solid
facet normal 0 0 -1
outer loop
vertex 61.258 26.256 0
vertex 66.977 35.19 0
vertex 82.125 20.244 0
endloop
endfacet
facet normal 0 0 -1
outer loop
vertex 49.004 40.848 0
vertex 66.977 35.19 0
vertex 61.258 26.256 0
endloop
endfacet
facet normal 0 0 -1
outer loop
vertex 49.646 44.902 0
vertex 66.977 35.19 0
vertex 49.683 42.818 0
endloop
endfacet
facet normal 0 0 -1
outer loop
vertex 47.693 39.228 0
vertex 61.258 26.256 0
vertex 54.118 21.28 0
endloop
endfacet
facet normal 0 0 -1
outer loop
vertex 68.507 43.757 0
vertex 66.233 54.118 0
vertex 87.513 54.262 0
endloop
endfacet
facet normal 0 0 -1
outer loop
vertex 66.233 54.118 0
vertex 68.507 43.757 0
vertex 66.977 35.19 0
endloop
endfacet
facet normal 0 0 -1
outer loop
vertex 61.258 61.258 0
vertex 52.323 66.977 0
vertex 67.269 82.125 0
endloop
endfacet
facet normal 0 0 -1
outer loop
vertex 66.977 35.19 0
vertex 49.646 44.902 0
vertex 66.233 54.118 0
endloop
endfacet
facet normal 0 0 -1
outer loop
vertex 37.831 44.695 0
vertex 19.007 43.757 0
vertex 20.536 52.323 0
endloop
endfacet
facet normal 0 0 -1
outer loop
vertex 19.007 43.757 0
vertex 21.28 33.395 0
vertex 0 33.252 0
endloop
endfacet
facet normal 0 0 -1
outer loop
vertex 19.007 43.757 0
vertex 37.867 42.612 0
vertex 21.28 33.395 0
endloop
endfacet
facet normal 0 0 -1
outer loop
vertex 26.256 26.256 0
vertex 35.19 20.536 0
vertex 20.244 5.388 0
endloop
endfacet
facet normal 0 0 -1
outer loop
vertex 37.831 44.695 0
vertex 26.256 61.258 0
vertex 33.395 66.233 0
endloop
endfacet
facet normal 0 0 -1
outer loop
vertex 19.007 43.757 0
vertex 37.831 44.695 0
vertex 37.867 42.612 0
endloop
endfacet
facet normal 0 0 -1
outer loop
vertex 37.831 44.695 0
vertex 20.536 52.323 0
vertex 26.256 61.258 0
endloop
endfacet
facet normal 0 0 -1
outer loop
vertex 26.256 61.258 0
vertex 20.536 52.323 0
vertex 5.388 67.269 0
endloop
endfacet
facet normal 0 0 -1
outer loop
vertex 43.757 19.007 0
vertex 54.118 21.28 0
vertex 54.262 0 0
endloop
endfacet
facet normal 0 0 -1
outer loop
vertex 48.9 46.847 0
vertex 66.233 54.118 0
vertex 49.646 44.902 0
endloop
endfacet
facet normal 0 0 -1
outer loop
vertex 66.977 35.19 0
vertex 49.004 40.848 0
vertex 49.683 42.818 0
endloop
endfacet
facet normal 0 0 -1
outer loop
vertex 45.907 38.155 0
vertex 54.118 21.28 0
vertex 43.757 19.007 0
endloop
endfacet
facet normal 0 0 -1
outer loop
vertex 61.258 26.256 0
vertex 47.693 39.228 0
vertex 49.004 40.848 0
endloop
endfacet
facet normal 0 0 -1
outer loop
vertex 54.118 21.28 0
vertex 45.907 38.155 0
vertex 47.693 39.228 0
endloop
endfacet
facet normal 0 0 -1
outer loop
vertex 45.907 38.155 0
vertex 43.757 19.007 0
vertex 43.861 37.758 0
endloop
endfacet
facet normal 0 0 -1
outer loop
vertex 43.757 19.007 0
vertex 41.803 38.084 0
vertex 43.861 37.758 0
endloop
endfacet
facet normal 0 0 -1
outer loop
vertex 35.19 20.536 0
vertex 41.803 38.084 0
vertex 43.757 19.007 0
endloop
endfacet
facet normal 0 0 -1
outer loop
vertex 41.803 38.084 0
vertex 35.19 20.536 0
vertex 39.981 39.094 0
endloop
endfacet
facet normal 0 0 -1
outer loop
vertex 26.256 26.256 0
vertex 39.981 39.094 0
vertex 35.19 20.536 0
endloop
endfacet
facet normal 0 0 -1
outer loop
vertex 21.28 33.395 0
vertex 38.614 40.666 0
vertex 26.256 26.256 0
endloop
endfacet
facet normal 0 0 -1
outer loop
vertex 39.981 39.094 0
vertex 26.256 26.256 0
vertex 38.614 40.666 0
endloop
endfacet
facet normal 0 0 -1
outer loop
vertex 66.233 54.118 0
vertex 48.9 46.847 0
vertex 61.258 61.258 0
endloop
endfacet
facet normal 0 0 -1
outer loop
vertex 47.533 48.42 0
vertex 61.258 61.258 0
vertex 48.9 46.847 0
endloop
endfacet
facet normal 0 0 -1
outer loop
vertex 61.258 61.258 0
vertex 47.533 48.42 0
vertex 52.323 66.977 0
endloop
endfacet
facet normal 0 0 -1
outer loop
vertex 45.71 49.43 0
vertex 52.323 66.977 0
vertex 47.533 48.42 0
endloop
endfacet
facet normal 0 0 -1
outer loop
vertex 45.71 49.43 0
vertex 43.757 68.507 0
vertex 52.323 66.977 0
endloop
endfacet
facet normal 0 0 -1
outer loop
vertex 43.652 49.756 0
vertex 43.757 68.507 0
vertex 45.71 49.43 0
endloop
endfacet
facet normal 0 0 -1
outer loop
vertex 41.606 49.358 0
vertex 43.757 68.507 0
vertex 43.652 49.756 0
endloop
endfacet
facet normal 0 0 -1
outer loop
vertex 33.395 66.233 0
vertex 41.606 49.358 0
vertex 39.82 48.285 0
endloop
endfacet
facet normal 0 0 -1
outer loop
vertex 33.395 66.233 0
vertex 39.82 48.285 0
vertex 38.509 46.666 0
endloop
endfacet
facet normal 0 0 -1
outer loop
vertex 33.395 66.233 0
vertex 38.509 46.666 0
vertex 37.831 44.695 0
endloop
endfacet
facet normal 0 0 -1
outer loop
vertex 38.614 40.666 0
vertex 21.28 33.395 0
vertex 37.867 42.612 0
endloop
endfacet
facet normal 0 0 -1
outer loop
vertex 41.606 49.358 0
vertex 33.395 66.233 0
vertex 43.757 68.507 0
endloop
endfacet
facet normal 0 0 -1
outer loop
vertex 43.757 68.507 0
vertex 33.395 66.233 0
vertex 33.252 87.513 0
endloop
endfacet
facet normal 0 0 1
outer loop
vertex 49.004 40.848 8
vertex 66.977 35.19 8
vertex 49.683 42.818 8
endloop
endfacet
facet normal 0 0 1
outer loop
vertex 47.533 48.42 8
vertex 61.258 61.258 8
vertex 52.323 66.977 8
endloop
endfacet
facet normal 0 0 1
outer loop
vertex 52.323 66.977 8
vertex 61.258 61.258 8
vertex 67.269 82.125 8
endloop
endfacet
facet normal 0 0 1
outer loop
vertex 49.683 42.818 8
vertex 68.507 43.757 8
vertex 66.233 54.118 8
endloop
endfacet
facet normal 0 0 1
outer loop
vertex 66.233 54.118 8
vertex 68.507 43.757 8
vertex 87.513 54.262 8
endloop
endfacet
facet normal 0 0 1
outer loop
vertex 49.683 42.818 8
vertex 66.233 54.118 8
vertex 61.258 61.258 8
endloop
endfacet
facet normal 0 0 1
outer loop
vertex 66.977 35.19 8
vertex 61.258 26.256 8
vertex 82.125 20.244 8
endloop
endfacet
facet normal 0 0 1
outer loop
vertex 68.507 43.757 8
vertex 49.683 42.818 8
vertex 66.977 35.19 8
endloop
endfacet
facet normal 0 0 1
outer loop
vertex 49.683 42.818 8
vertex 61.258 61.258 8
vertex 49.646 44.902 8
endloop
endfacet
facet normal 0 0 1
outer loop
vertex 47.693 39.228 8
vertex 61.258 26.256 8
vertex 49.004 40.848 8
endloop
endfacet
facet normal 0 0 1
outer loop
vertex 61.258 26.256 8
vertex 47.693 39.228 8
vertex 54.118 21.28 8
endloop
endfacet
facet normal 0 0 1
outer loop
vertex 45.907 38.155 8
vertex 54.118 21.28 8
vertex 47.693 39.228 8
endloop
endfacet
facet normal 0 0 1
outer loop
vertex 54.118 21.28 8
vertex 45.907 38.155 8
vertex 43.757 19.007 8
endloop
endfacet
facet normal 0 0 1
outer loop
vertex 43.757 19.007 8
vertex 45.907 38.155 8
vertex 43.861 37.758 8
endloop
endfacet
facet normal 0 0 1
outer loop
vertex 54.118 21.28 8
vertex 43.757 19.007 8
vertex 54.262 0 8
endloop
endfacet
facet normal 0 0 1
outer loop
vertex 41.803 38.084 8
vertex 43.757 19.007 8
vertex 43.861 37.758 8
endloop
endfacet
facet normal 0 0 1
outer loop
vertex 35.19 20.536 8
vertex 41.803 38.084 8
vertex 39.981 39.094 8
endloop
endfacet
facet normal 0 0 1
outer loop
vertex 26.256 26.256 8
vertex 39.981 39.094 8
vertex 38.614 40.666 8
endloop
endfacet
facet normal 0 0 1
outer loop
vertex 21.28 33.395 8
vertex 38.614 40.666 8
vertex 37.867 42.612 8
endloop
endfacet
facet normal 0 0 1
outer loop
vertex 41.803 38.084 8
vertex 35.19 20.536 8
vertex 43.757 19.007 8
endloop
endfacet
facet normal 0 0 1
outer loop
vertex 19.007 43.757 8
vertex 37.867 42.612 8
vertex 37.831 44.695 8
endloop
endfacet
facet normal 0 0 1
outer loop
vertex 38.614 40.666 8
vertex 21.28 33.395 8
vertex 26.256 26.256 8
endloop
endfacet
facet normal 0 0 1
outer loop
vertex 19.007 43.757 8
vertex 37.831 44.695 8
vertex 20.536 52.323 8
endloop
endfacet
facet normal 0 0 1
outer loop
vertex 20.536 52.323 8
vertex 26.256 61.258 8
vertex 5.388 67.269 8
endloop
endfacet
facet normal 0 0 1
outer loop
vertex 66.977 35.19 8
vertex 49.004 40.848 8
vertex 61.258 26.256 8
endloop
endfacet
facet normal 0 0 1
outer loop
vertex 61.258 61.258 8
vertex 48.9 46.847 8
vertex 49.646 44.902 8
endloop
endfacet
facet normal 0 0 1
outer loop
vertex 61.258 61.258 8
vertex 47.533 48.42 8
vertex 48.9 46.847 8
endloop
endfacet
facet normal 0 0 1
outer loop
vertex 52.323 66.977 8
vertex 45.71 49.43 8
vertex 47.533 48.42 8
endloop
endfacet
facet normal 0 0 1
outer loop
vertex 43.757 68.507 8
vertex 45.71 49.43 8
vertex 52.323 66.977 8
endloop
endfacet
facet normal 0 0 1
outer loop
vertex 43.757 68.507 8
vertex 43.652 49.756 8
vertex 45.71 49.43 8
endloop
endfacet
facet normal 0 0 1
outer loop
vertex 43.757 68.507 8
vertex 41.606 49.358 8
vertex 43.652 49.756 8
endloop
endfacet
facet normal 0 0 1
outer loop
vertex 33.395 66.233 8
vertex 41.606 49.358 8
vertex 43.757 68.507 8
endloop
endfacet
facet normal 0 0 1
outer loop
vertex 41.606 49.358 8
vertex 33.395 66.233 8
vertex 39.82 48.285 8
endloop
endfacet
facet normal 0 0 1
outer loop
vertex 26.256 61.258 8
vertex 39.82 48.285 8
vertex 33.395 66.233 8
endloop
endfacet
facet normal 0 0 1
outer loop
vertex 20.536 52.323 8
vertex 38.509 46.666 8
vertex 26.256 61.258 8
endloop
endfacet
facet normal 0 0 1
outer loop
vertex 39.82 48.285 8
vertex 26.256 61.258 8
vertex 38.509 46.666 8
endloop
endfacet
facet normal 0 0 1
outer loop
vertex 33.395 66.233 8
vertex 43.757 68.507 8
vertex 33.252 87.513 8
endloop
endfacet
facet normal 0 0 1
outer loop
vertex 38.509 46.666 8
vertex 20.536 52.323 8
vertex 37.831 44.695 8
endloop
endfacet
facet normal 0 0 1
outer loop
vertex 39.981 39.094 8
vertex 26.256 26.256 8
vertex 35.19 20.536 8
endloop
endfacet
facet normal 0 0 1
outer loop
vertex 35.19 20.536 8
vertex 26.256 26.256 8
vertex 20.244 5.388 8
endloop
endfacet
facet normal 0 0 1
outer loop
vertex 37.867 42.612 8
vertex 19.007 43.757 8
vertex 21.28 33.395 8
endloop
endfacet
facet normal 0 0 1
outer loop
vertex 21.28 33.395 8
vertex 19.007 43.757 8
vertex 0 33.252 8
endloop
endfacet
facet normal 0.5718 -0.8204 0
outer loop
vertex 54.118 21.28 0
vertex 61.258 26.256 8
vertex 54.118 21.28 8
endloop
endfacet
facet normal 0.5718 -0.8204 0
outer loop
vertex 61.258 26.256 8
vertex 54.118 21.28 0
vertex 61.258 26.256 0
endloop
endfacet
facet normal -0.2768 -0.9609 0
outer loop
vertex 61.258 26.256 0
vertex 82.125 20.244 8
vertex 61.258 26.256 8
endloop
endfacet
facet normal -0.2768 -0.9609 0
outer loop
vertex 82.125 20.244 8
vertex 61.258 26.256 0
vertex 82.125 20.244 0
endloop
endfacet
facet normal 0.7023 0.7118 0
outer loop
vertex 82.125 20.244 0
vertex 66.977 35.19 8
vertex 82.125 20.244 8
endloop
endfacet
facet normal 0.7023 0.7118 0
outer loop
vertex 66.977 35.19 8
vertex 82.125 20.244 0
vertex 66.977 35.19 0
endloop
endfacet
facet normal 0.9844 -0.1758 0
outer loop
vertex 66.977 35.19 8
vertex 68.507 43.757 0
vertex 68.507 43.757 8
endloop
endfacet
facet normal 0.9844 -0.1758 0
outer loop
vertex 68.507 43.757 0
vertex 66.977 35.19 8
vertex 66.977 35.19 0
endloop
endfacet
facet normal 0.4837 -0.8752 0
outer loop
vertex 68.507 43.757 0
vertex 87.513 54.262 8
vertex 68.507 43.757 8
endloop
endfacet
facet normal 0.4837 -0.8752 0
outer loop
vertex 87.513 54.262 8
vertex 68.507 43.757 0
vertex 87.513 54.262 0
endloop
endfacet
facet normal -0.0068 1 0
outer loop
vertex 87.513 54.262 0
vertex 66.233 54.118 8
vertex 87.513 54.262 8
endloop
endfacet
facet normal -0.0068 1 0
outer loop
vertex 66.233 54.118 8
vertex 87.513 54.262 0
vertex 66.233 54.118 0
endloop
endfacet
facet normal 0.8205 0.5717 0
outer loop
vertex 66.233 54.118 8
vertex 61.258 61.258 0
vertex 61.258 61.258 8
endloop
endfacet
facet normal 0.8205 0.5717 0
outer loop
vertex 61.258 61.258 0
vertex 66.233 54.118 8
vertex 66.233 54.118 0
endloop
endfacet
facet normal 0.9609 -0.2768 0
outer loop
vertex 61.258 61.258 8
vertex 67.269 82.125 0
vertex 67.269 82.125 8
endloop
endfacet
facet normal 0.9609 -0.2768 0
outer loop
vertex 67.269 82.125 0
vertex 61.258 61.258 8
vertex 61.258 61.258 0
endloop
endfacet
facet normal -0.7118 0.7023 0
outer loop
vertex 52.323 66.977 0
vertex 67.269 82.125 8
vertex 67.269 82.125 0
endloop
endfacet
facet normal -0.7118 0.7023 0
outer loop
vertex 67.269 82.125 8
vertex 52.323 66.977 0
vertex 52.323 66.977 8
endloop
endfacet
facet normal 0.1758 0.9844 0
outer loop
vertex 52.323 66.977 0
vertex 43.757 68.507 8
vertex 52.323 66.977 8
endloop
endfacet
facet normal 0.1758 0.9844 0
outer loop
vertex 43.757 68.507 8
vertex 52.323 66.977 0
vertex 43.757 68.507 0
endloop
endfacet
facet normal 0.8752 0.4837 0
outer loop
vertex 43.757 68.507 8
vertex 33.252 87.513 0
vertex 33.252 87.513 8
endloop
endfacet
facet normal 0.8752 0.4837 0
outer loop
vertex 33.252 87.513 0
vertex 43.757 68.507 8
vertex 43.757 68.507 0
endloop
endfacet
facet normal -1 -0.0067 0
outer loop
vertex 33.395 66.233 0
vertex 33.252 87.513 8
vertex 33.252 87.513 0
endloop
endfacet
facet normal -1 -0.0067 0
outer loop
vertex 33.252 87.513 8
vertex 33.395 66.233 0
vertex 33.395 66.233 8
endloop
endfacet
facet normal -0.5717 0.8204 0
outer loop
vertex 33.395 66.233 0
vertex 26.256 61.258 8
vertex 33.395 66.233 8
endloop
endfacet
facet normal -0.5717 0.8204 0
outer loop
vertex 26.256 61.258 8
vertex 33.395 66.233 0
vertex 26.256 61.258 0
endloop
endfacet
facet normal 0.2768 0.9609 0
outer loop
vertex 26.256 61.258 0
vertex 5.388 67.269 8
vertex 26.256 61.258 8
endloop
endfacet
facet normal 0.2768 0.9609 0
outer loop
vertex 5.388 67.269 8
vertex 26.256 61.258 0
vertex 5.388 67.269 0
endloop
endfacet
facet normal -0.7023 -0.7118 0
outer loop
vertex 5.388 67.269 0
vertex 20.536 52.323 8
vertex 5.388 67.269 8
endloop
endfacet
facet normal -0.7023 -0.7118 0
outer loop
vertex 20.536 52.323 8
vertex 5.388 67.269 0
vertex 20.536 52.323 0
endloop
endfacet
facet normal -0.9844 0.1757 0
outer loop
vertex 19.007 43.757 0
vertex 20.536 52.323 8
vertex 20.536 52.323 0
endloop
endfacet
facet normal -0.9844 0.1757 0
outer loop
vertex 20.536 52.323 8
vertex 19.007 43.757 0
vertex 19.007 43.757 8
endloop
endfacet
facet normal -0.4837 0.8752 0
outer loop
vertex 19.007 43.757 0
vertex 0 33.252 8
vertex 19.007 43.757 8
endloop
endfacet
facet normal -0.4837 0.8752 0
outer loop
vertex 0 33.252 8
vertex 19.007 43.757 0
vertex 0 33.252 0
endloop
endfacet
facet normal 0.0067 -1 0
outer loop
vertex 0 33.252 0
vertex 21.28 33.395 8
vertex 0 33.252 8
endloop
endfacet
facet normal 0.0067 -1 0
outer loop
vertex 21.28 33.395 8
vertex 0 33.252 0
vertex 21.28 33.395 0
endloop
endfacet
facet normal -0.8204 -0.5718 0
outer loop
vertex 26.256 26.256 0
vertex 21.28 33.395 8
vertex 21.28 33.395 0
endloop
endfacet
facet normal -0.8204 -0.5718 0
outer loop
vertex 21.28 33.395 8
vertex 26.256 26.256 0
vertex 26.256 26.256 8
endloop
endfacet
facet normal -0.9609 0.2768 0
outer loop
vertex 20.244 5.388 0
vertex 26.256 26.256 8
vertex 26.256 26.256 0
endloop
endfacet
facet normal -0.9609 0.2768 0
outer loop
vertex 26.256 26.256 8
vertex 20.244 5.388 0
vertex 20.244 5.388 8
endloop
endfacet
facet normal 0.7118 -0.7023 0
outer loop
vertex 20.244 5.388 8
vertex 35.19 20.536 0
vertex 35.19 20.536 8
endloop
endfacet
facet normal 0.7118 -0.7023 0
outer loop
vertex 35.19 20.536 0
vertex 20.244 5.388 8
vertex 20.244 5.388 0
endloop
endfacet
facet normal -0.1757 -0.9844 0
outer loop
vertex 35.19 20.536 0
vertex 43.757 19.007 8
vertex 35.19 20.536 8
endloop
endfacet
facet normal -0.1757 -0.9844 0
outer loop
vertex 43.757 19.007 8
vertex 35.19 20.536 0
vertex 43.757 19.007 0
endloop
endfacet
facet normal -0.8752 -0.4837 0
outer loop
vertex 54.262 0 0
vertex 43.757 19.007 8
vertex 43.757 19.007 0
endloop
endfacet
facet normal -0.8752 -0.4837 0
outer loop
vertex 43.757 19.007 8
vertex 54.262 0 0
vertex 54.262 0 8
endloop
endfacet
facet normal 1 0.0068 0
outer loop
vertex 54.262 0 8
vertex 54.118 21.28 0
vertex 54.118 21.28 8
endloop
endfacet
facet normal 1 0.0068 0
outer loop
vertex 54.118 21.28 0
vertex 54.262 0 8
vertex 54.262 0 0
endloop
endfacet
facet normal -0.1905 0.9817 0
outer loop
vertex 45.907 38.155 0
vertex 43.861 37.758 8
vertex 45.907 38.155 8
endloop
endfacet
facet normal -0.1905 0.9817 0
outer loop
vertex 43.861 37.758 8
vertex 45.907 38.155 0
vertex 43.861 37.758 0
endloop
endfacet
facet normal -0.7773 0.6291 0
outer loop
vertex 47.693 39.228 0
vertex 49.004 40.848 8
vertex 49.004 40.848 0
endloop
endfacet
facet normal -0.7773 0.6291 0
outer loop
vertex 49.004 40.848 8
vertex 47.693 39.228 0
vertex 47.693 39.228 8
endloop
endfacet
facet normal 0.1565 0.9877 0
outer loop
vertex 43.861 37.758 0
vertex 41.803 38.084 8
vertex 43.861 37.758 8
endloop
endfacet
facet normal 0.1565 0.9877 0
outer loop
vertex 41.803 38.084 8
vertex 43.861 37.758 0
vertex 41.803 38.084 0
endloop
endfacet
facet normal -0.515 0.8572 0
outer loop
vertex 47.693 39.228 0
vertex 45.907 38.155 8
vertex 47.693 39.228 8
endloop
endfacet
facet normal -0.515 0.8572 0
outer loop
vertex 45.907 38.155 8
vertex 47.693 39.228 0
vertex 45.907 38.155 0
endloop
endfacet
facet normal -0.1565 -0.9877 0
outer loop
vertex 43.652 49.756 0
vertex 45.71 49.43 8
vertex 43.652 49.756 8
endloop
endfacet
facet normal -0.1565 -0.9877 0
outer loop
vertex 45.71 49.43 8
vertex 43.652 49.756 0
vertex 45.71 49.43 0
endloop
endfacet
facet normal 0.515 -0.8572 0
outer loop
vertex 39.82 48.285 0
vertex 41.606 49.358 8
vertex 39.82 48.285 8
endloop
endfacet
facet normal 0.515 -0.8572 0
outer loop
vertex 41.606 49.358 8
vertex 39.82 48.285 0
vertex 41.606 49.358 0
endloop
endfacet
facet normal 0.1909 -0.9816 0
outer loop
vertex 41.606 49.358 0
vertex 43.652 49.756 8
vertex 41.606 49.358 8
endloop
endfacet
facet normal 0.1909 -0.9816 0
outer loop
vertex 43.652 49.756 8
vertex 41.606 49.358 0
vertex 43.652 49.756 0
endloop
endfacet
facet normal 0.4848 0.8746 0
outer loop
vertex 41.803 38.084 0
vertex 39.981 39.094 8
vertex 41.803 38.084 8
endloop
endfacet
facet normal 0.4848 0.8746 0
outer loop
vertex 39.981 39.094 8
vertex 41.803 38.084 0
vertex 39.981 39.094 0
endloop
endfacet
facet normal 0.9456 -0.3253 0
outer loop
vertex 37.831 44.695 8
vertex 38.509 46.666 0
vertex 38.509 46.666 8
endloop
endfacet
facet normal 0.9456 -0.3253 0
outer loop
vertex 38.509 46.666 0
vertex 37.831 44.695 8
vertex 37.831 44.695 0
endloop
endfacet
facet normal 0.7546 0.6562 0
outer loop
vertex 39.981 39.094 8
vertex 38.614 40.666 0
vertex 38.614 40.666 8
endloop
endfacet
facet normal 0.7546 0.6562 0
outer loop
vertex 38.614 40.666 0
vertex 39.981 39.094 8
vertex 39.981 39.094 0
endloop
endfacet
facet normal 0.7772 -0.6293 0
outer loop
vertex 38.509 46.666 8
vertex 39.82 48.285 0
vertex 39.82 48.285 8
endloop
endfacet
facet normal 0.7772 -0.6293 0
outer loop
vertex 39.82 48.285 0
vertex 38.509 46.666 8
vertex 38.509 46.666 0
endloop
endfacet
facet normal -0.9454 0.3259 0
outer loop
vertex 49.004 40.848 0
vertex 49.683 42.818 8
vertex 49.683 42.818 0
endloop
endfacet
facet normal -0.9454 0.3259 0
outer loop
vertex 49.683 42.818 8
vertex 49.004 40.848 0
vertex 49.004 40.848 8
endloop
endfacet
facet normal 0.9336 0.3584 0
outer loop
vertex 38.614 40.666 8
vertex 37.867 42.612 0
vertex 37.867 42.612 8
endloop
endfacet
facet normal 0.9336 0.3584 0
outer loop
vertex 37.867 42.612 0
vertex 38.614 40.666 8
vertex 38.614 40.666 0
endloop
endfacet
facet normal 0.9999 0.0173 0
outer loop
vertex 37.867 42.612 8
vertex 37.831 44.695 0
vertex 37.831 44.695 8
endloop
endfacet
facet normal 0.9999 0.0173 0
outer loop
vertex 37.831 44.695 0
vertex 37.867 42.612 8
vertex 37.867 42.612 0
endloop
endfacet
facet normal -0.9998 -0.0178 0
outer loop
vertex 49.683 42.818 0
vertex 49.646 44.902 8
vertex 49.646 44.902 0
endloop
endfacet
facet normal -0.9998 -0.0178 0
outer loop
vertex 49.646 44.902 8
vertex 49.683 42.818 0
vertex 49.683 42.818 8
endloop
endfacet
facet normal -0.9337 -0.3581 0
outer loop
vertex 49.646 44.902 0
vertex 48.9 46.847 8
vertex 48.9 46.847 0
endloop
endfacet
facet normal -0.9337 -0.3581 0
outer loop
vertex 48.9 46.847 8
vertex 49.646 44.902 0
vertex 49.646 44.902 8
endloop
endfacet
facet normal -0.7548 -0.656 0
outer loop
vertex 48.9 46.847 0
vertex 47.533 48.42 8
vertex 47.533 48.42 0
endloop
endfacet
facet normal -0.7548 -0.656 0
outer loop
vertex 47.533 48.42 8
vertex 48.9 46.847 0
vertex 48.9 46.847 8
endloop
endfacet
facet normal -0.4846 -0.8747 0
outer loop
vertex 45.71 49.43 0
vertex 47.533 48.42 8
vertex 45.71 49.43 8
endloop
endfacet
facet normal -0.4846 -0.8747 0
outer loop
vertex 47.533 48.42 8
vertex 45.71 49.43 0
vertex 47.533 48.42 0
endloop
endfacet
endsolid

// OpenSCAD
$fn = 32;

// ----------------------------------------------------------------------
// Star wheel: 8-point ratchet, R45
// ----------------------------------------------------------------------

// --- parameters (mm) ---
n_points = 8;             // number of points / teeth
r_out = 45;               // tip radius
r_in = 24.75;             // root radius
bore_r = 6;               // centre bore radius
plate_t = 8;              // plate thickness, Z (extrusion height)
bore_d = 12;              // centre bore diameter
fit_tol = 0.1;            // declared fit tolerance (prompt contract)
free_tol = 0.5;           // declared free tolerance (prompt contract)

profile = [[19.007, 43.757], [0, 33.252], [21.28, 33.395], [26.256, 26.256], [20.244, 5.388], [35.19, 20.536], [43.757, 19.007], [54.262, 0], [54.118, 21.28], [61.258, 26.256], [82.125, 20.244], [66.977, 35.19], [68.507, 43.757], [87.513, 54.262], [66.233, 54.118], [61.258, 61.258], [67.269, 82.125], [52.323, 66.977], [43.757, 68.507], [33.252, 87.513], [33.395, 66.233], [26.256, 61.258], [5.388, 67.269], [20.536, 52.323]];  // primary outline, 24 points, counter clockwise
void_1 = [[49.646, 44.902], [48.9, 46.847], [47.533, 48.42], [45.71, 49.43], [43.652, 49.756], [41.606, 49.358], [39.82, 48.285], [38.509, 46.666], [37.831, 44.695], [37.867, 42.612], [38.614, 40.666], [39.981, 39.094], [41.803, 38.084], [43.861, 37.758], [45.907, 38.155], [47.693, 39.228], [49.004, 40.848], [49.683, 42.818]];  // centre bore, 18 points

// --- the one profile operation ---
difference() {
  linear_extrude(height = plate_t) polygon(points = profile);
  translate([0, 0, -1])
    linear_extrude(height = plate_t + 2) polygon(points = void_1);
}
